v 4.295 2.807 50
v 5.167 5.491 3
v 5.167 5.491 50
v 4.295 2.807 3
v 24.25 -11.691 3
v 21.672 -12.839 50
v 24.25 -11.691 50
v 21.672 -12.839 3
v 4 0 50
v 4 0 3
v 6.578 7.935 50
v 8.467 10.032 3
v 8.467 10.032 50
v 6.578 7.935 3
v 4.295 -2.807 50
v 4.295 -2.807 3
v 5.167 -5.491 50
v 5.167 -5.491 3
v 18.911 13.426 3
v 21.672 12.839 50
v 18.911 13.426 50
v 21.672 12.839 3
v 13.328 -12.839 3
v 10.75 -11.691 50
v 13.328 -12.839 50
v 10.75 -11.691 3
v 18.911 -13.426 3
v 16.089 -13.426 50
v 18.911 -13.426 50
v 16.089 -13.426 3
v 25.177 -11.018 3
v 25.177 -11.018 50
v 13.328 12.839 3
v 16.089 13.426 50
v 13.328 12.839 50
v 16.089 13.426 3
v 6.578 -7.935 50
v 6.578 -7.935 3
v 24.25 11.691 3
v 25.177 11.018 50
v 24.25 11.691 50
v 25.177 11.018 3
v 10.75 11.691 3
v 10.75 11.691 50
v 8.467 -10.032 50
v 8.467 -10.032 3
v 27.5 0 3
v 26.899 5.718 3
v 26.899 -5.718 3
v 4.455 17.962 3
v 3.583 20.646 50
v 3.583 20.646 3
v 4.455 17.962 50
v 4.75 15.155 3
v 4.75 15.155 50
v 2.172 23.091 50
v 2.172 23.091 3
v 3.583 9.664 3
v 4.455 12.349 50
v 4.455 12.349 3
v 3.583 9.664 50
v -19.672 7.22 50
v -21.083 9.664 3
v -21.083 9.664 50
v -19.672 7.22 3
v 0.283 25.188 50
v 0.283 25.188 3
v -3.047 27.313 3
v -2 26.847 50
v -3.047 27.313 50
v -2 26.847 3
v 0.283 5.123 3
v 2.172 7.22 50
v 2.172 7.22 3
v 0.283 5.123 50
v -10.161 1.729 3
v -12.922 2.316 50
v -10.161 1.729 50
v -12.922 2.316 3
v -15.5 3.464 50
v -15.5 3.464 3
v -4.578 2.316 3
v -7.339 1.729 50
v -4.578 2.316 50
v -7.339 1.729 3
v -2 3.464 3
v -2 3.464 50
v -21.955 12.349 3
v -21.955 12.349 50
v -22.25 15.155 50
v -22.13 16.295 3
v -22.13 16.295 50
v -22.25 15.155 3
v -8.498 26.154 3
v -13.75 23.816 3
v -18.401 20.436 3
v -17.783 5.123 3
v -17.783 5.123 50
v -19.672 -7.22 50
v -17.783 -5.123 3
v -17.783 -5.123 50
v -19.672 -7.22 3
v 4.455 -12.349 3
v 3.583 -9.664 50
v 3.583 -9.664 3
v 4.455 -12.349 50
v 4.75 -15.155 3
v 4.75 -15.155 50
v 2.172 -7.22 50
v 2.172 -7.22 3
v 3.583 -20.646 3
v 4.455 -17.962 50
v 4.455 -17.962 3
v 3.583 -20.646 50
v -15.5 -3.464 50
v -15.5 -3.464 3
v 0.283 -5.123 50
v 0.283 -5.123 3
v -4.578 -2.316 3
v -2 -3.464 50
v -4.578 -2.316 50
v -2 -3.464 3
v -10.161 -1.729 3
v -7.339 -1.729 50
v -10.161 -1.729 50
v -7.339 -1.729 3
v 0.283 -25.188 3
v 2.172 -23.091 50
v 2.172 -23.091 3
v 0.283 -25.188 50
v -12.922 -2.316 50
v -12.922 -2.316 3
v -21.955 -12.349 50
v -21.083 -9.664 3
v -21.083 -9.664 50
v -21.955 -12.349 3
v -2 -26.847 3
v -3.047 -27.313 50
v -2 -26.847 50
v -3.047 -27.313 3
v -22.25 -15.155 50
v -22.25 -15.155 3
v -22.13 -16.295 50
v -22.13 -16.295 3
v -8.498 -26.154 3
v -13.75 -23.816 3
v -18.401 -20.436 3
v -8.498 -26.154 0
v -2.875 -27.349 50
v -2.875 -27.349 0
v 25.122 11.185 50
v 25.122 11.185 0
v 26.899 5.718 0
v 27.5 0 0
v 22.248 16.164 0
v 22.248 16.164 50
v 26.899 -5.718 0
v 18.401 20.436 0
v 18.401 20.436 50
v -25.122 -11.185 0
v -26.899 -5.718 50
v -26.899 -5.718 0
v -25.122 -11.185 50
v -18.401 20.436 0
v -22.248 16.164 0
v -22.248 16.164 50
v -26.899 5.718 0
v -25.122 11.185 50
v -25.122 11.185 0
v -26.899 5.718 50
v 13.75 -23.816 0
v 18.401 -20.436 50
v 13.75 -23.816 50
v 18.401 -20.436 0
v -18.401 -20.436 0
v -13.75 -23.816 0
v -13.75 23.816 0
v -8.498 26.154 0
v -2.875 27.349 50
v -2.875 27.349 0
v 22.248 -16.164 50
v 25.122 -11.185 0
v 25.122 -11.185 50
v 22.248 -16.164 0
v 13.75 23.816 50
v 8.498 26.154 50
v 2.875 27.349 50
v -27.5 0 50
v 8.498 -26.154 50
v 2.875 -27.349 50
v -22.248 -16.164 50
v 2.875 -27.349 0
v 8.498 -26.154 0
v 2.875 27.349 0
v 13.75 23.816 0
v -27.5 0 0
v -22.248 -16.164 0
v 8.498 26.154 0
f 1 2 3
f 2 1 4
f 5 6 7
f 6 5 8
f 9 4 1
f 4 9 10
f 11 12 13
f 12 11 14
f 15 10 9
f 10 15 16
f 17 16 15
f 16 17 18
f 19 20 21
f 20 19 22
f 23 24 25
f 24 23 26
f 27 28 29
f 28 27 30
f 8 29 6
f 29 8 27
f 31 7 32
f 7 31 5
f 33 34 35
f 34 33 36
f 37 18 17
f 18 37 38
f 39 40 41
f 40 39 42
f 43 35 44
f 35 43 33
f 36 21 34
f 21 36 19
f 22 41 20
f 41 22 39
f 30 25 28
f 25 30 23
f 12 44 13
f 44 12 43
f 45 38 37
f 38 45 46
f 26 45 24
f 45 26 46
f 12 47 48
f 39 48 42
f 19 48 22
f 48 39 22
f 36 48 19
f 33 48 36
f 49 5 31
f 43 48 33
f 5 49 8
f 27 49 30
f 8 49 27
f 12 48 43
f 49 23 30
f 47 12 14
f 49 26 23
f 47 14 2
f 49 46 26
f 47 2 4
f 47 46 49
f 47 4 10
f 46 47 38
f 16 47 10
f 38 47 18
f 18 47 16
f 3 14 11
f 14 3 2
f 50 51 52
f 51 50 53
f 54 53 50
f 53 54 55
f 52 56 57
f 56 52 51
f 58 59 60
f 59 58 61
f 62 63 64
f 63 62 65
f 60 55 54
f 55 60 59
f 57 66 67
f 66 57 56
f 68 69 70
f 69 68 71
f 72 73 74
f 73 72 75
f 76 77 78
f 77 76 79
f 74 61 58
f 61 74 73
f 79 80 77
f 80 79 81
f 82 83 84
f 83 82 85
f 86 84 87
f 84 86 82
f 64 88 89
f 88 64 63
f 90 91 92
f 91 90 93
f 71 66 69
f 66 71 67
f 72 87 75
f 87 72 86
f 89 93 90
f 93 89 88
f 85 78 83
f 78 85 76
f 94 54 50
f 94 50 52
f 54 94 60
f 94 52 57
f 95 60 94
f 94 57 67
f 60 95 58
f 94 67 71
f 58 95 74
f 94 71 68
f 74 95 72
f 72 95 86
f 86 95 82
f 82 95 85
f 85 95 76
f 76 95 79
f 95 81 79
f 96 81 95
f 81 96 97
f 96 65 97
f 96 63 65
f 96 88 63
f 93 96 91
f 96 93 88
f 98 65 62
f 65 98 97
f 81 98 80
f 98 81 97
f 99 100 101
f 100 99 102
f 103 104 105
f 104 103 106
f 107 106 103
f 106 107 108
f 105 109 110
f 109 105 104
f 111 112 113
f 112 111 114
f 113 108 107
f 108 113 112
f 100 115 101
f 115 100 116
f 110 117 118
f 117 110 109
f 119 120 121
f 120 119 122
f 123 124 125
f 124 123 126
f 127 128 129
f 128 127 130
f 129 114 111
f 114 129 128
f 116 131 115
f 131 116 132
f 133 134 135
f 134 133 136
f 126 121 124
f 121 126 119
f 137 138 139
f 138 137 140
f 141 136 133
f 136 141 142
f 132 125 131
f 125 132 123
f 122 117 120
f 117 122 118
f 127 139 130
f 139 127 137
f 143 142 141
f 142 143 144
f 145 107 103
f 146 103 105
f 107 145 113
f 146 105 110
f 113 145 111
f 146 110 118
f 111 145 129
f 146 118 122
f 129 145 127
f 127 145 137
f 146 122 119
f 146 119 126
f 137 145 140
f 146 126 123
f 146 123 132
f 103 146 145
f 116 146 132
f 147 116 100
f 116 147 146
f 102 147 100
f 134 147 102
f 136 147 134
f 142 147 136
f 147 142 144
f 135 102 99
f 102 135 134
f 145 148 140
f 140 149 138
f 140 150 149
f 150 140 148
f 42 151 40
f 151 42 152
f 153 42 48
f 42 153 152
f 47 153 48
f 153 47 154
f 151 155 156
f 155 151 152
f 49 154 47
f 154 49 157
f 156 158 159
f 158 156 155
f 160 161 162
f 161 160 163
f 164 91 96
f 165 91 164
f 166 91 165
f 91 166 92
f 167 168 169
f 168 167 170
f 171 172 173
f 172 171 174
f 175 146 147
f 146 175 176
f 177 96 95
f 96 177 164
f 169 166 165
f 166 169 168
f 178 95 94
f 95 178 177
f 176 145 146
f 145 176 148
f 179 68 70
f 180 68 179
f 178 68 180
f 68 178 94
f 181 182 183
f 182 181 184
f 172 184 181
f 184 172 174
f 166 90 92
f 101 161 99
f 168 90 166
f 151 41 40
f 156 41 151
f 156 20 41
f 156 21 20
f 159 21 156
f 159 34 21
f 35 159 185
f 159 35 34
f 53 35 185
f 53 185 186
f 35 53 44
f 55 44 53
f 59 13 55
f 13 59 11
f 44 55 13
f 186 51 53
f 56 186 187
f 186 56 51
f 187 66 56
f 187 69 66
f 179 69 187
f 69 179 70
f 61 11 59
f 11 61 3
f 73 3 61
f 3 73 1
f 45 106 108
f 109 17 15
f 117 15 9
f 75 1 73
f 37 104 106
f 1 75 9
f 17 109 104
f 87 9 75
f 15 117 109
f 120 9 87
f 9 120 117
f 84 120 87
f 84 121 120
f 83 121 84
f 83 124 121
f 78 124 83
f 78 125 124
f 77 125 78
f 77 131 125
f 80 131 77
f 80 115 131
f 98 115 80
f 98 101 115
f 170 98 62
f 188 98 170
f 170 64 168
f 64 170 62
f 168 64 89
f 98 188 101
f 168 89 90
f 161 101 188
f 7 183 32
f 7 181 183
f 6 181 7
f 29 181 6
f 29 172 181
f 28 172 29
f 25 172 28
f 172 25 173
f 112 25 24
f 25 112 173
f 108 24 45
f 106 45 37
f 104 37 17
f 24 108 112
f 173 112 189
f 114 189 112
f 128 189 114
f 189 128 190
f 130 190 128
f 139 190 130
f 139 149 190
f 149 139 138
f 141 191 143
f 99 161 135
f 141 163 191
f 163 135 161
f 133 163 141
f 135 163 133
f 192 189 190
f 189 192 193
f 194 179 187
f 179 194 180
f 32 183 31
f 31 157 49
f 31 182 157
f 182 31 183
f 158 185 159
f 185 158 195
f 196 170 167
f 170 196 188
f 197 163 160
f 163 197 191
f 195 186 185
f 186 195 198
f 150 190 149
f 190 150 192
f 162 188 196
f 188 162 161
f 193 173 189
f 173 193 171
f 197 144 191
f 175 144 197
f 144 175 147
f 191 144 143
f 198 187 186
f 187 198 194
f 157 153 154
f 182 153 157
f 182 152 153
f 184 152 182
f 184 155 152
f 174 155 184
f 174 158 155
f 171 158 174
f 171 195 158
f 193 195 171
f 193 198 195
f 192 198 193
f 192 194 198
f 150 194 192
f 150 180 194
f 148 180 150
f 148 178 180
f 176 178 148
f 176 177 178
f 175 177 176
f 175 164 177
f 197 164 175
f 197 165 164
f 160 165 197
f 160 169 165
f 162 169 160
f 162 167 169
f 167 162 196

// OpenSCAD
// Customizable circular token holder for board games
// Matthew (Nick) Veldt

// Number of token slots
Number = 3; //[3,4,5]

// Should they all be the same size?
Same_size = "yes"; // [yes,no]

// Height in mm
h = 50;

// Wiggle room
w = 1;

// Diameter of first (and largest) token in mm
d1 = 25;

// Diameter of second token
d2 = 15;

// Diameter of third token
d3 = 15;

// Diameter of fourth token
d4 = 10;

// Diameter of fifth token
d5 = 10;

dArray = [d1,d2,d3,d4,d5];
module base() {
    cylinder(h, r = d1*(0.5+0.2*Number));
    
}

module cylinders() {
    factor = 0.2*Number + 0.1;
    if (Same_size == "yes"){
        for (i = [0:Number -1]) {
            alpha = i *360/Number;
            translate([factor*d1*cos(alpha),factor*d1*sin(alpha),3])
            cylinder(h,(d1/2 + w),(d1/2+w));
        }
    }
    if (Same_size == "no"){
        for (i = [0:Number -1]) {
            alpha = -i *360/Number;
            translate([factor*(1.4*d1-0.4*dArray[i])*cos(alpha),factor*(1.2*d1-0.2*dArray[i])*sin(alpha),3])
            cylinder(h,(dArray[i]/2 + w),(dArray[i]/2+w));
        }
        
    }
    
}
difference(){
    base();
    cylinders();
}
